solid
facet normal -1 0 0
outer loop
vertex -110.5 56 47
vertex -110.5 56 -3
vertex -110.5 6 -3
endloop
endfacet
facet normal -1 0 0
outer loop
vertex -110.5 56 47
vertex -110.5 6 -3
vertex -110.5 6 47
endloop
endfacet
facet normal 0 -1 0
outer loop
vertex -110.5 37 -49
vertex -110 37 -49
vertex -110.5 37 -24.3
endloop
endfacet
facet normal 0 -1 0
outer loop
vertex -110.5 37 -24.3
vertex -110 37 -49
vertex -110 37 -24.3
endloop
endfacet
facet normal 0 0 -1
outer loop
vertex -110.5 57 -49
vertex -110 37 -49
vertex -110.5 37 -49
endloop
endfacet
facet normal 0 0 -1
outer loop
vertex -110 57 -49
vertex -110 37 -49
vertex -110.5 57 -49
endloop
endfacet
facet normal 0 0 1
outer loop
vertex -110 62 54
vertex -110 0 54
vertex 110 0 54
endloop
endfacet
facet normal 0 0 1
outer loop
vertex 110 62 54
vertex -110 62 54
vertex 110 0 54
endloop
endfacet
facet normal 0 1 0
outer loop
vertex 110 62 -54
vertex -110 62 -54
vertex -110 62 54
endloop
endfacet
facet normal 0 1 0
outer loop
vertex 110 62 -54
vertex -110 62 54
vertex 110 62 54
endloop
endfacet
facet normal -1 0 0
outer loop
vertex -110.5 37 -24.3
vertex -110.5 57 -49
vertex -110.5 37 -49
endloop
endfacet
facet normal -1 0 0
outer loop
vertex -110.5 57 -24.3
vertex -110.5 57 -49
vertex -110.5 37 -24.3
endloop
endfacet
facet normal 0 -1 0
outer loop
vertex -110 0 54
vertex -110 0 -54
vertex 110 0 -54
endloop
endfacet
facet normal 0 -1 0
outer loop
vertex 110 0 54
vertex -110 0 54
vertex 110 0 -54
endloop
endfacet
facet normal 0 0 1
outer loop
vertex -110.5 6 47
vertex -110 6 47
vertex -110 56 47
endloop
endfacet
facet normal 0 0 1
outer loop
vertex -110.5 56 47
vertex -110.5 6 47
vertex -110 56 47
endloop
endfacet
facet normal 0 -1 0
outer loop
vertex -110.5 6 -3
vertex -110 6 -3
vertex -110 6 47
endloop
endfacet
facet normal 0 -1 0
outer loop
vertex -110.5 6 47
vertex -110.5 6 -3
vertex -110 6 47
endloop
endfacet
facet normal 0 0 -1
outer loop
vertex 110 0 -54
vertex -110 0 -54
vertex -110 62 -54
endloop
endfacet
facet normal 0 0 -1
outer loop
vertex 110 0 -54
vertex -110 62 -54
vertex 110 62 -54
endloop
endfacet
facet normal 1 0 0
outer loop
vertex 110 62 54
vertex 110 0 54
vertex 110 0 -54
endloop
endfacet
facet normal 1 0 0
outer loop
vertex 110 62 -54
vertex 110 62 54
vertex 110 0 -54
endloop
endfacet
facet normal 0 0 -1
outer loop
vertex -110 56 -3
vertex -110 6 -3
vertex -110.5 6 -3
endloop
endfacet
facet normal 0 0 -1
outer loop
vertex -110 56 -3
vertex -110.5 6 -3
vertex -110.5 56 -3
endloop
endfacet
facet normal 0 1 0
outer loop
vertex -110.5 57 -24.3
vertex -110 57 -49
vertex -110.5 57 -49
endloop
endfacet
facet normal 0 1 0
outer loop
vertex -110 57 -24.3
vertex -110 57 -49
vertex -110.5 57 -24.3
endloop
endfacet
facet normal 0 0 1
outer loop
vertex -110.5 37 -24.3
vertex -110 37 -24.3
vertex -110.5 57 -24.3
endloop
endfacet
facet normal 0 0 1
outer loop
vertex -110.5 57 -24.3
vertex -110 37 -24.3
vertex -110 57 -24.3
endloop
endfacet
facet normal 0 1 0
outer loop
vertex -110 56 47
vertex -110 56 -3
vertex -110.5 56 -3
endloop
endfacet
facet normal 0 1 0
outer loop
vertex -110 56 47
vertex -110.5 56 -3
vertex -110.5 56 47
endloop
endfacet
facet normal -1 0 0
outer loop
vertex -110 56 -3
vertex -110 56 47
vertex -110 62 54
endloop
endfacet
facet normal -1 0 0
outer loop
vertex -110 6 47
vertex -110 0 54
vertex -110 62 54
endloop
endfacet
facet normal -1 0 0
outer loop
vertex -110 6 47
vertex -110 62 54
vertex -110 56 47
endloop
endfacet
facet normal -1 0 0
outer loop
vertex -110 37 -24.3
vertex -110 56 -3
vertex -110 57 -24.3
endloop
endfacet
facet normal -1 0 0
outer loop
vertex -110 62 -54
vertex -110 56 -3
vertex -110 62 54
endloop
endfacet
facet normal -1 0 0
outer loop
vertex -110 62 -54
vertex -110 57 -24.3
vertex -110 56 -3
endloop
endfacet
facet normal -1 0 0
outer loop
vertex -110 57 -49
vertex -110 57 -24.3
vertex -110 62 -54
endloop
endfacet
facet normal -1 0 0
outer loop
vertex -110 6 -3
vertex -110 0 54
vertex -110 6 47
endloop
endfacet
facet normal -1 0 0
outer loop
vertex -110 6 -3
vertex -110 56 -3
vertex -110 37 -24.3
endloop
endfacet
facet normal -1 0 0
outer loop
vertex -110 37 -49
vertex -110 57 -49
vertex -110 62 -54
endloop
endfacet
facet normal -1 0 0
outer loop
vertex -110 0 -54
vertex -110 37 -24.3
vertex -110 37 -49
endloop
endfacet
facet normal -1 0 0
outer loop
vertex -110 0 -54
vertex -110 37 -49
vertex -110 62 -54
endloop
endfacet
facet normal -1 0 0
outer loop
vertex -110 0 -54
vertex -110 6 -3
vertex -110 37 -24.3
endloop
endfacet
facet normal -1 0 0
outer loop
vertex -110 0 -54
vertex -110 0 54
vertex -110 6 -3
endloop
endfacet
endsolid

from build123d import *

# Parameters (mm, degrees)
SZKIC1_W                    = 220
SZKIC1_H                    = 108
DODANIE_WYCI_GNI_CIE1_DEPTH = 62
SZKIC2_W                    = 24.7
SZKIC2_H                    = 20
SZKIC2_W_2                  = 50
SZKIC2_H_2                  = 50
DODANIE_WYCI_GNI_CIE2_DEPTH = 0.5


with BuildPart() as part:
    # Szkic1 → Dodanie-wyciągnięcie1 (new body)
    with BuildSketch(Plane(origin=(0, 0, 0), x_dir=(1, 0, 0), z_dir=(0, 1, 0))):
        Rectangle(SZKIC1_W, SZKIC1_H)
    extrude(amount=DODANIE_WYCI_GNI_CIE1_DEPTH)

    # Szkic2 → Dodanie-wyciągnięcie2 (add)
    with BuildSketch(Plane.ZY.offset(110)):
        with Locations((-36.65, 47)):
            Rectangle(SZKIC2_W, SZKIC2_H)
        with Locations((22, 31)):
            Rectangle(SZKIC2_W_2, SZKIC2_H_2)
    extrude(amount=DODANIE_WYCI_GNI_CIE2_DEPTH)


solid = part.part
